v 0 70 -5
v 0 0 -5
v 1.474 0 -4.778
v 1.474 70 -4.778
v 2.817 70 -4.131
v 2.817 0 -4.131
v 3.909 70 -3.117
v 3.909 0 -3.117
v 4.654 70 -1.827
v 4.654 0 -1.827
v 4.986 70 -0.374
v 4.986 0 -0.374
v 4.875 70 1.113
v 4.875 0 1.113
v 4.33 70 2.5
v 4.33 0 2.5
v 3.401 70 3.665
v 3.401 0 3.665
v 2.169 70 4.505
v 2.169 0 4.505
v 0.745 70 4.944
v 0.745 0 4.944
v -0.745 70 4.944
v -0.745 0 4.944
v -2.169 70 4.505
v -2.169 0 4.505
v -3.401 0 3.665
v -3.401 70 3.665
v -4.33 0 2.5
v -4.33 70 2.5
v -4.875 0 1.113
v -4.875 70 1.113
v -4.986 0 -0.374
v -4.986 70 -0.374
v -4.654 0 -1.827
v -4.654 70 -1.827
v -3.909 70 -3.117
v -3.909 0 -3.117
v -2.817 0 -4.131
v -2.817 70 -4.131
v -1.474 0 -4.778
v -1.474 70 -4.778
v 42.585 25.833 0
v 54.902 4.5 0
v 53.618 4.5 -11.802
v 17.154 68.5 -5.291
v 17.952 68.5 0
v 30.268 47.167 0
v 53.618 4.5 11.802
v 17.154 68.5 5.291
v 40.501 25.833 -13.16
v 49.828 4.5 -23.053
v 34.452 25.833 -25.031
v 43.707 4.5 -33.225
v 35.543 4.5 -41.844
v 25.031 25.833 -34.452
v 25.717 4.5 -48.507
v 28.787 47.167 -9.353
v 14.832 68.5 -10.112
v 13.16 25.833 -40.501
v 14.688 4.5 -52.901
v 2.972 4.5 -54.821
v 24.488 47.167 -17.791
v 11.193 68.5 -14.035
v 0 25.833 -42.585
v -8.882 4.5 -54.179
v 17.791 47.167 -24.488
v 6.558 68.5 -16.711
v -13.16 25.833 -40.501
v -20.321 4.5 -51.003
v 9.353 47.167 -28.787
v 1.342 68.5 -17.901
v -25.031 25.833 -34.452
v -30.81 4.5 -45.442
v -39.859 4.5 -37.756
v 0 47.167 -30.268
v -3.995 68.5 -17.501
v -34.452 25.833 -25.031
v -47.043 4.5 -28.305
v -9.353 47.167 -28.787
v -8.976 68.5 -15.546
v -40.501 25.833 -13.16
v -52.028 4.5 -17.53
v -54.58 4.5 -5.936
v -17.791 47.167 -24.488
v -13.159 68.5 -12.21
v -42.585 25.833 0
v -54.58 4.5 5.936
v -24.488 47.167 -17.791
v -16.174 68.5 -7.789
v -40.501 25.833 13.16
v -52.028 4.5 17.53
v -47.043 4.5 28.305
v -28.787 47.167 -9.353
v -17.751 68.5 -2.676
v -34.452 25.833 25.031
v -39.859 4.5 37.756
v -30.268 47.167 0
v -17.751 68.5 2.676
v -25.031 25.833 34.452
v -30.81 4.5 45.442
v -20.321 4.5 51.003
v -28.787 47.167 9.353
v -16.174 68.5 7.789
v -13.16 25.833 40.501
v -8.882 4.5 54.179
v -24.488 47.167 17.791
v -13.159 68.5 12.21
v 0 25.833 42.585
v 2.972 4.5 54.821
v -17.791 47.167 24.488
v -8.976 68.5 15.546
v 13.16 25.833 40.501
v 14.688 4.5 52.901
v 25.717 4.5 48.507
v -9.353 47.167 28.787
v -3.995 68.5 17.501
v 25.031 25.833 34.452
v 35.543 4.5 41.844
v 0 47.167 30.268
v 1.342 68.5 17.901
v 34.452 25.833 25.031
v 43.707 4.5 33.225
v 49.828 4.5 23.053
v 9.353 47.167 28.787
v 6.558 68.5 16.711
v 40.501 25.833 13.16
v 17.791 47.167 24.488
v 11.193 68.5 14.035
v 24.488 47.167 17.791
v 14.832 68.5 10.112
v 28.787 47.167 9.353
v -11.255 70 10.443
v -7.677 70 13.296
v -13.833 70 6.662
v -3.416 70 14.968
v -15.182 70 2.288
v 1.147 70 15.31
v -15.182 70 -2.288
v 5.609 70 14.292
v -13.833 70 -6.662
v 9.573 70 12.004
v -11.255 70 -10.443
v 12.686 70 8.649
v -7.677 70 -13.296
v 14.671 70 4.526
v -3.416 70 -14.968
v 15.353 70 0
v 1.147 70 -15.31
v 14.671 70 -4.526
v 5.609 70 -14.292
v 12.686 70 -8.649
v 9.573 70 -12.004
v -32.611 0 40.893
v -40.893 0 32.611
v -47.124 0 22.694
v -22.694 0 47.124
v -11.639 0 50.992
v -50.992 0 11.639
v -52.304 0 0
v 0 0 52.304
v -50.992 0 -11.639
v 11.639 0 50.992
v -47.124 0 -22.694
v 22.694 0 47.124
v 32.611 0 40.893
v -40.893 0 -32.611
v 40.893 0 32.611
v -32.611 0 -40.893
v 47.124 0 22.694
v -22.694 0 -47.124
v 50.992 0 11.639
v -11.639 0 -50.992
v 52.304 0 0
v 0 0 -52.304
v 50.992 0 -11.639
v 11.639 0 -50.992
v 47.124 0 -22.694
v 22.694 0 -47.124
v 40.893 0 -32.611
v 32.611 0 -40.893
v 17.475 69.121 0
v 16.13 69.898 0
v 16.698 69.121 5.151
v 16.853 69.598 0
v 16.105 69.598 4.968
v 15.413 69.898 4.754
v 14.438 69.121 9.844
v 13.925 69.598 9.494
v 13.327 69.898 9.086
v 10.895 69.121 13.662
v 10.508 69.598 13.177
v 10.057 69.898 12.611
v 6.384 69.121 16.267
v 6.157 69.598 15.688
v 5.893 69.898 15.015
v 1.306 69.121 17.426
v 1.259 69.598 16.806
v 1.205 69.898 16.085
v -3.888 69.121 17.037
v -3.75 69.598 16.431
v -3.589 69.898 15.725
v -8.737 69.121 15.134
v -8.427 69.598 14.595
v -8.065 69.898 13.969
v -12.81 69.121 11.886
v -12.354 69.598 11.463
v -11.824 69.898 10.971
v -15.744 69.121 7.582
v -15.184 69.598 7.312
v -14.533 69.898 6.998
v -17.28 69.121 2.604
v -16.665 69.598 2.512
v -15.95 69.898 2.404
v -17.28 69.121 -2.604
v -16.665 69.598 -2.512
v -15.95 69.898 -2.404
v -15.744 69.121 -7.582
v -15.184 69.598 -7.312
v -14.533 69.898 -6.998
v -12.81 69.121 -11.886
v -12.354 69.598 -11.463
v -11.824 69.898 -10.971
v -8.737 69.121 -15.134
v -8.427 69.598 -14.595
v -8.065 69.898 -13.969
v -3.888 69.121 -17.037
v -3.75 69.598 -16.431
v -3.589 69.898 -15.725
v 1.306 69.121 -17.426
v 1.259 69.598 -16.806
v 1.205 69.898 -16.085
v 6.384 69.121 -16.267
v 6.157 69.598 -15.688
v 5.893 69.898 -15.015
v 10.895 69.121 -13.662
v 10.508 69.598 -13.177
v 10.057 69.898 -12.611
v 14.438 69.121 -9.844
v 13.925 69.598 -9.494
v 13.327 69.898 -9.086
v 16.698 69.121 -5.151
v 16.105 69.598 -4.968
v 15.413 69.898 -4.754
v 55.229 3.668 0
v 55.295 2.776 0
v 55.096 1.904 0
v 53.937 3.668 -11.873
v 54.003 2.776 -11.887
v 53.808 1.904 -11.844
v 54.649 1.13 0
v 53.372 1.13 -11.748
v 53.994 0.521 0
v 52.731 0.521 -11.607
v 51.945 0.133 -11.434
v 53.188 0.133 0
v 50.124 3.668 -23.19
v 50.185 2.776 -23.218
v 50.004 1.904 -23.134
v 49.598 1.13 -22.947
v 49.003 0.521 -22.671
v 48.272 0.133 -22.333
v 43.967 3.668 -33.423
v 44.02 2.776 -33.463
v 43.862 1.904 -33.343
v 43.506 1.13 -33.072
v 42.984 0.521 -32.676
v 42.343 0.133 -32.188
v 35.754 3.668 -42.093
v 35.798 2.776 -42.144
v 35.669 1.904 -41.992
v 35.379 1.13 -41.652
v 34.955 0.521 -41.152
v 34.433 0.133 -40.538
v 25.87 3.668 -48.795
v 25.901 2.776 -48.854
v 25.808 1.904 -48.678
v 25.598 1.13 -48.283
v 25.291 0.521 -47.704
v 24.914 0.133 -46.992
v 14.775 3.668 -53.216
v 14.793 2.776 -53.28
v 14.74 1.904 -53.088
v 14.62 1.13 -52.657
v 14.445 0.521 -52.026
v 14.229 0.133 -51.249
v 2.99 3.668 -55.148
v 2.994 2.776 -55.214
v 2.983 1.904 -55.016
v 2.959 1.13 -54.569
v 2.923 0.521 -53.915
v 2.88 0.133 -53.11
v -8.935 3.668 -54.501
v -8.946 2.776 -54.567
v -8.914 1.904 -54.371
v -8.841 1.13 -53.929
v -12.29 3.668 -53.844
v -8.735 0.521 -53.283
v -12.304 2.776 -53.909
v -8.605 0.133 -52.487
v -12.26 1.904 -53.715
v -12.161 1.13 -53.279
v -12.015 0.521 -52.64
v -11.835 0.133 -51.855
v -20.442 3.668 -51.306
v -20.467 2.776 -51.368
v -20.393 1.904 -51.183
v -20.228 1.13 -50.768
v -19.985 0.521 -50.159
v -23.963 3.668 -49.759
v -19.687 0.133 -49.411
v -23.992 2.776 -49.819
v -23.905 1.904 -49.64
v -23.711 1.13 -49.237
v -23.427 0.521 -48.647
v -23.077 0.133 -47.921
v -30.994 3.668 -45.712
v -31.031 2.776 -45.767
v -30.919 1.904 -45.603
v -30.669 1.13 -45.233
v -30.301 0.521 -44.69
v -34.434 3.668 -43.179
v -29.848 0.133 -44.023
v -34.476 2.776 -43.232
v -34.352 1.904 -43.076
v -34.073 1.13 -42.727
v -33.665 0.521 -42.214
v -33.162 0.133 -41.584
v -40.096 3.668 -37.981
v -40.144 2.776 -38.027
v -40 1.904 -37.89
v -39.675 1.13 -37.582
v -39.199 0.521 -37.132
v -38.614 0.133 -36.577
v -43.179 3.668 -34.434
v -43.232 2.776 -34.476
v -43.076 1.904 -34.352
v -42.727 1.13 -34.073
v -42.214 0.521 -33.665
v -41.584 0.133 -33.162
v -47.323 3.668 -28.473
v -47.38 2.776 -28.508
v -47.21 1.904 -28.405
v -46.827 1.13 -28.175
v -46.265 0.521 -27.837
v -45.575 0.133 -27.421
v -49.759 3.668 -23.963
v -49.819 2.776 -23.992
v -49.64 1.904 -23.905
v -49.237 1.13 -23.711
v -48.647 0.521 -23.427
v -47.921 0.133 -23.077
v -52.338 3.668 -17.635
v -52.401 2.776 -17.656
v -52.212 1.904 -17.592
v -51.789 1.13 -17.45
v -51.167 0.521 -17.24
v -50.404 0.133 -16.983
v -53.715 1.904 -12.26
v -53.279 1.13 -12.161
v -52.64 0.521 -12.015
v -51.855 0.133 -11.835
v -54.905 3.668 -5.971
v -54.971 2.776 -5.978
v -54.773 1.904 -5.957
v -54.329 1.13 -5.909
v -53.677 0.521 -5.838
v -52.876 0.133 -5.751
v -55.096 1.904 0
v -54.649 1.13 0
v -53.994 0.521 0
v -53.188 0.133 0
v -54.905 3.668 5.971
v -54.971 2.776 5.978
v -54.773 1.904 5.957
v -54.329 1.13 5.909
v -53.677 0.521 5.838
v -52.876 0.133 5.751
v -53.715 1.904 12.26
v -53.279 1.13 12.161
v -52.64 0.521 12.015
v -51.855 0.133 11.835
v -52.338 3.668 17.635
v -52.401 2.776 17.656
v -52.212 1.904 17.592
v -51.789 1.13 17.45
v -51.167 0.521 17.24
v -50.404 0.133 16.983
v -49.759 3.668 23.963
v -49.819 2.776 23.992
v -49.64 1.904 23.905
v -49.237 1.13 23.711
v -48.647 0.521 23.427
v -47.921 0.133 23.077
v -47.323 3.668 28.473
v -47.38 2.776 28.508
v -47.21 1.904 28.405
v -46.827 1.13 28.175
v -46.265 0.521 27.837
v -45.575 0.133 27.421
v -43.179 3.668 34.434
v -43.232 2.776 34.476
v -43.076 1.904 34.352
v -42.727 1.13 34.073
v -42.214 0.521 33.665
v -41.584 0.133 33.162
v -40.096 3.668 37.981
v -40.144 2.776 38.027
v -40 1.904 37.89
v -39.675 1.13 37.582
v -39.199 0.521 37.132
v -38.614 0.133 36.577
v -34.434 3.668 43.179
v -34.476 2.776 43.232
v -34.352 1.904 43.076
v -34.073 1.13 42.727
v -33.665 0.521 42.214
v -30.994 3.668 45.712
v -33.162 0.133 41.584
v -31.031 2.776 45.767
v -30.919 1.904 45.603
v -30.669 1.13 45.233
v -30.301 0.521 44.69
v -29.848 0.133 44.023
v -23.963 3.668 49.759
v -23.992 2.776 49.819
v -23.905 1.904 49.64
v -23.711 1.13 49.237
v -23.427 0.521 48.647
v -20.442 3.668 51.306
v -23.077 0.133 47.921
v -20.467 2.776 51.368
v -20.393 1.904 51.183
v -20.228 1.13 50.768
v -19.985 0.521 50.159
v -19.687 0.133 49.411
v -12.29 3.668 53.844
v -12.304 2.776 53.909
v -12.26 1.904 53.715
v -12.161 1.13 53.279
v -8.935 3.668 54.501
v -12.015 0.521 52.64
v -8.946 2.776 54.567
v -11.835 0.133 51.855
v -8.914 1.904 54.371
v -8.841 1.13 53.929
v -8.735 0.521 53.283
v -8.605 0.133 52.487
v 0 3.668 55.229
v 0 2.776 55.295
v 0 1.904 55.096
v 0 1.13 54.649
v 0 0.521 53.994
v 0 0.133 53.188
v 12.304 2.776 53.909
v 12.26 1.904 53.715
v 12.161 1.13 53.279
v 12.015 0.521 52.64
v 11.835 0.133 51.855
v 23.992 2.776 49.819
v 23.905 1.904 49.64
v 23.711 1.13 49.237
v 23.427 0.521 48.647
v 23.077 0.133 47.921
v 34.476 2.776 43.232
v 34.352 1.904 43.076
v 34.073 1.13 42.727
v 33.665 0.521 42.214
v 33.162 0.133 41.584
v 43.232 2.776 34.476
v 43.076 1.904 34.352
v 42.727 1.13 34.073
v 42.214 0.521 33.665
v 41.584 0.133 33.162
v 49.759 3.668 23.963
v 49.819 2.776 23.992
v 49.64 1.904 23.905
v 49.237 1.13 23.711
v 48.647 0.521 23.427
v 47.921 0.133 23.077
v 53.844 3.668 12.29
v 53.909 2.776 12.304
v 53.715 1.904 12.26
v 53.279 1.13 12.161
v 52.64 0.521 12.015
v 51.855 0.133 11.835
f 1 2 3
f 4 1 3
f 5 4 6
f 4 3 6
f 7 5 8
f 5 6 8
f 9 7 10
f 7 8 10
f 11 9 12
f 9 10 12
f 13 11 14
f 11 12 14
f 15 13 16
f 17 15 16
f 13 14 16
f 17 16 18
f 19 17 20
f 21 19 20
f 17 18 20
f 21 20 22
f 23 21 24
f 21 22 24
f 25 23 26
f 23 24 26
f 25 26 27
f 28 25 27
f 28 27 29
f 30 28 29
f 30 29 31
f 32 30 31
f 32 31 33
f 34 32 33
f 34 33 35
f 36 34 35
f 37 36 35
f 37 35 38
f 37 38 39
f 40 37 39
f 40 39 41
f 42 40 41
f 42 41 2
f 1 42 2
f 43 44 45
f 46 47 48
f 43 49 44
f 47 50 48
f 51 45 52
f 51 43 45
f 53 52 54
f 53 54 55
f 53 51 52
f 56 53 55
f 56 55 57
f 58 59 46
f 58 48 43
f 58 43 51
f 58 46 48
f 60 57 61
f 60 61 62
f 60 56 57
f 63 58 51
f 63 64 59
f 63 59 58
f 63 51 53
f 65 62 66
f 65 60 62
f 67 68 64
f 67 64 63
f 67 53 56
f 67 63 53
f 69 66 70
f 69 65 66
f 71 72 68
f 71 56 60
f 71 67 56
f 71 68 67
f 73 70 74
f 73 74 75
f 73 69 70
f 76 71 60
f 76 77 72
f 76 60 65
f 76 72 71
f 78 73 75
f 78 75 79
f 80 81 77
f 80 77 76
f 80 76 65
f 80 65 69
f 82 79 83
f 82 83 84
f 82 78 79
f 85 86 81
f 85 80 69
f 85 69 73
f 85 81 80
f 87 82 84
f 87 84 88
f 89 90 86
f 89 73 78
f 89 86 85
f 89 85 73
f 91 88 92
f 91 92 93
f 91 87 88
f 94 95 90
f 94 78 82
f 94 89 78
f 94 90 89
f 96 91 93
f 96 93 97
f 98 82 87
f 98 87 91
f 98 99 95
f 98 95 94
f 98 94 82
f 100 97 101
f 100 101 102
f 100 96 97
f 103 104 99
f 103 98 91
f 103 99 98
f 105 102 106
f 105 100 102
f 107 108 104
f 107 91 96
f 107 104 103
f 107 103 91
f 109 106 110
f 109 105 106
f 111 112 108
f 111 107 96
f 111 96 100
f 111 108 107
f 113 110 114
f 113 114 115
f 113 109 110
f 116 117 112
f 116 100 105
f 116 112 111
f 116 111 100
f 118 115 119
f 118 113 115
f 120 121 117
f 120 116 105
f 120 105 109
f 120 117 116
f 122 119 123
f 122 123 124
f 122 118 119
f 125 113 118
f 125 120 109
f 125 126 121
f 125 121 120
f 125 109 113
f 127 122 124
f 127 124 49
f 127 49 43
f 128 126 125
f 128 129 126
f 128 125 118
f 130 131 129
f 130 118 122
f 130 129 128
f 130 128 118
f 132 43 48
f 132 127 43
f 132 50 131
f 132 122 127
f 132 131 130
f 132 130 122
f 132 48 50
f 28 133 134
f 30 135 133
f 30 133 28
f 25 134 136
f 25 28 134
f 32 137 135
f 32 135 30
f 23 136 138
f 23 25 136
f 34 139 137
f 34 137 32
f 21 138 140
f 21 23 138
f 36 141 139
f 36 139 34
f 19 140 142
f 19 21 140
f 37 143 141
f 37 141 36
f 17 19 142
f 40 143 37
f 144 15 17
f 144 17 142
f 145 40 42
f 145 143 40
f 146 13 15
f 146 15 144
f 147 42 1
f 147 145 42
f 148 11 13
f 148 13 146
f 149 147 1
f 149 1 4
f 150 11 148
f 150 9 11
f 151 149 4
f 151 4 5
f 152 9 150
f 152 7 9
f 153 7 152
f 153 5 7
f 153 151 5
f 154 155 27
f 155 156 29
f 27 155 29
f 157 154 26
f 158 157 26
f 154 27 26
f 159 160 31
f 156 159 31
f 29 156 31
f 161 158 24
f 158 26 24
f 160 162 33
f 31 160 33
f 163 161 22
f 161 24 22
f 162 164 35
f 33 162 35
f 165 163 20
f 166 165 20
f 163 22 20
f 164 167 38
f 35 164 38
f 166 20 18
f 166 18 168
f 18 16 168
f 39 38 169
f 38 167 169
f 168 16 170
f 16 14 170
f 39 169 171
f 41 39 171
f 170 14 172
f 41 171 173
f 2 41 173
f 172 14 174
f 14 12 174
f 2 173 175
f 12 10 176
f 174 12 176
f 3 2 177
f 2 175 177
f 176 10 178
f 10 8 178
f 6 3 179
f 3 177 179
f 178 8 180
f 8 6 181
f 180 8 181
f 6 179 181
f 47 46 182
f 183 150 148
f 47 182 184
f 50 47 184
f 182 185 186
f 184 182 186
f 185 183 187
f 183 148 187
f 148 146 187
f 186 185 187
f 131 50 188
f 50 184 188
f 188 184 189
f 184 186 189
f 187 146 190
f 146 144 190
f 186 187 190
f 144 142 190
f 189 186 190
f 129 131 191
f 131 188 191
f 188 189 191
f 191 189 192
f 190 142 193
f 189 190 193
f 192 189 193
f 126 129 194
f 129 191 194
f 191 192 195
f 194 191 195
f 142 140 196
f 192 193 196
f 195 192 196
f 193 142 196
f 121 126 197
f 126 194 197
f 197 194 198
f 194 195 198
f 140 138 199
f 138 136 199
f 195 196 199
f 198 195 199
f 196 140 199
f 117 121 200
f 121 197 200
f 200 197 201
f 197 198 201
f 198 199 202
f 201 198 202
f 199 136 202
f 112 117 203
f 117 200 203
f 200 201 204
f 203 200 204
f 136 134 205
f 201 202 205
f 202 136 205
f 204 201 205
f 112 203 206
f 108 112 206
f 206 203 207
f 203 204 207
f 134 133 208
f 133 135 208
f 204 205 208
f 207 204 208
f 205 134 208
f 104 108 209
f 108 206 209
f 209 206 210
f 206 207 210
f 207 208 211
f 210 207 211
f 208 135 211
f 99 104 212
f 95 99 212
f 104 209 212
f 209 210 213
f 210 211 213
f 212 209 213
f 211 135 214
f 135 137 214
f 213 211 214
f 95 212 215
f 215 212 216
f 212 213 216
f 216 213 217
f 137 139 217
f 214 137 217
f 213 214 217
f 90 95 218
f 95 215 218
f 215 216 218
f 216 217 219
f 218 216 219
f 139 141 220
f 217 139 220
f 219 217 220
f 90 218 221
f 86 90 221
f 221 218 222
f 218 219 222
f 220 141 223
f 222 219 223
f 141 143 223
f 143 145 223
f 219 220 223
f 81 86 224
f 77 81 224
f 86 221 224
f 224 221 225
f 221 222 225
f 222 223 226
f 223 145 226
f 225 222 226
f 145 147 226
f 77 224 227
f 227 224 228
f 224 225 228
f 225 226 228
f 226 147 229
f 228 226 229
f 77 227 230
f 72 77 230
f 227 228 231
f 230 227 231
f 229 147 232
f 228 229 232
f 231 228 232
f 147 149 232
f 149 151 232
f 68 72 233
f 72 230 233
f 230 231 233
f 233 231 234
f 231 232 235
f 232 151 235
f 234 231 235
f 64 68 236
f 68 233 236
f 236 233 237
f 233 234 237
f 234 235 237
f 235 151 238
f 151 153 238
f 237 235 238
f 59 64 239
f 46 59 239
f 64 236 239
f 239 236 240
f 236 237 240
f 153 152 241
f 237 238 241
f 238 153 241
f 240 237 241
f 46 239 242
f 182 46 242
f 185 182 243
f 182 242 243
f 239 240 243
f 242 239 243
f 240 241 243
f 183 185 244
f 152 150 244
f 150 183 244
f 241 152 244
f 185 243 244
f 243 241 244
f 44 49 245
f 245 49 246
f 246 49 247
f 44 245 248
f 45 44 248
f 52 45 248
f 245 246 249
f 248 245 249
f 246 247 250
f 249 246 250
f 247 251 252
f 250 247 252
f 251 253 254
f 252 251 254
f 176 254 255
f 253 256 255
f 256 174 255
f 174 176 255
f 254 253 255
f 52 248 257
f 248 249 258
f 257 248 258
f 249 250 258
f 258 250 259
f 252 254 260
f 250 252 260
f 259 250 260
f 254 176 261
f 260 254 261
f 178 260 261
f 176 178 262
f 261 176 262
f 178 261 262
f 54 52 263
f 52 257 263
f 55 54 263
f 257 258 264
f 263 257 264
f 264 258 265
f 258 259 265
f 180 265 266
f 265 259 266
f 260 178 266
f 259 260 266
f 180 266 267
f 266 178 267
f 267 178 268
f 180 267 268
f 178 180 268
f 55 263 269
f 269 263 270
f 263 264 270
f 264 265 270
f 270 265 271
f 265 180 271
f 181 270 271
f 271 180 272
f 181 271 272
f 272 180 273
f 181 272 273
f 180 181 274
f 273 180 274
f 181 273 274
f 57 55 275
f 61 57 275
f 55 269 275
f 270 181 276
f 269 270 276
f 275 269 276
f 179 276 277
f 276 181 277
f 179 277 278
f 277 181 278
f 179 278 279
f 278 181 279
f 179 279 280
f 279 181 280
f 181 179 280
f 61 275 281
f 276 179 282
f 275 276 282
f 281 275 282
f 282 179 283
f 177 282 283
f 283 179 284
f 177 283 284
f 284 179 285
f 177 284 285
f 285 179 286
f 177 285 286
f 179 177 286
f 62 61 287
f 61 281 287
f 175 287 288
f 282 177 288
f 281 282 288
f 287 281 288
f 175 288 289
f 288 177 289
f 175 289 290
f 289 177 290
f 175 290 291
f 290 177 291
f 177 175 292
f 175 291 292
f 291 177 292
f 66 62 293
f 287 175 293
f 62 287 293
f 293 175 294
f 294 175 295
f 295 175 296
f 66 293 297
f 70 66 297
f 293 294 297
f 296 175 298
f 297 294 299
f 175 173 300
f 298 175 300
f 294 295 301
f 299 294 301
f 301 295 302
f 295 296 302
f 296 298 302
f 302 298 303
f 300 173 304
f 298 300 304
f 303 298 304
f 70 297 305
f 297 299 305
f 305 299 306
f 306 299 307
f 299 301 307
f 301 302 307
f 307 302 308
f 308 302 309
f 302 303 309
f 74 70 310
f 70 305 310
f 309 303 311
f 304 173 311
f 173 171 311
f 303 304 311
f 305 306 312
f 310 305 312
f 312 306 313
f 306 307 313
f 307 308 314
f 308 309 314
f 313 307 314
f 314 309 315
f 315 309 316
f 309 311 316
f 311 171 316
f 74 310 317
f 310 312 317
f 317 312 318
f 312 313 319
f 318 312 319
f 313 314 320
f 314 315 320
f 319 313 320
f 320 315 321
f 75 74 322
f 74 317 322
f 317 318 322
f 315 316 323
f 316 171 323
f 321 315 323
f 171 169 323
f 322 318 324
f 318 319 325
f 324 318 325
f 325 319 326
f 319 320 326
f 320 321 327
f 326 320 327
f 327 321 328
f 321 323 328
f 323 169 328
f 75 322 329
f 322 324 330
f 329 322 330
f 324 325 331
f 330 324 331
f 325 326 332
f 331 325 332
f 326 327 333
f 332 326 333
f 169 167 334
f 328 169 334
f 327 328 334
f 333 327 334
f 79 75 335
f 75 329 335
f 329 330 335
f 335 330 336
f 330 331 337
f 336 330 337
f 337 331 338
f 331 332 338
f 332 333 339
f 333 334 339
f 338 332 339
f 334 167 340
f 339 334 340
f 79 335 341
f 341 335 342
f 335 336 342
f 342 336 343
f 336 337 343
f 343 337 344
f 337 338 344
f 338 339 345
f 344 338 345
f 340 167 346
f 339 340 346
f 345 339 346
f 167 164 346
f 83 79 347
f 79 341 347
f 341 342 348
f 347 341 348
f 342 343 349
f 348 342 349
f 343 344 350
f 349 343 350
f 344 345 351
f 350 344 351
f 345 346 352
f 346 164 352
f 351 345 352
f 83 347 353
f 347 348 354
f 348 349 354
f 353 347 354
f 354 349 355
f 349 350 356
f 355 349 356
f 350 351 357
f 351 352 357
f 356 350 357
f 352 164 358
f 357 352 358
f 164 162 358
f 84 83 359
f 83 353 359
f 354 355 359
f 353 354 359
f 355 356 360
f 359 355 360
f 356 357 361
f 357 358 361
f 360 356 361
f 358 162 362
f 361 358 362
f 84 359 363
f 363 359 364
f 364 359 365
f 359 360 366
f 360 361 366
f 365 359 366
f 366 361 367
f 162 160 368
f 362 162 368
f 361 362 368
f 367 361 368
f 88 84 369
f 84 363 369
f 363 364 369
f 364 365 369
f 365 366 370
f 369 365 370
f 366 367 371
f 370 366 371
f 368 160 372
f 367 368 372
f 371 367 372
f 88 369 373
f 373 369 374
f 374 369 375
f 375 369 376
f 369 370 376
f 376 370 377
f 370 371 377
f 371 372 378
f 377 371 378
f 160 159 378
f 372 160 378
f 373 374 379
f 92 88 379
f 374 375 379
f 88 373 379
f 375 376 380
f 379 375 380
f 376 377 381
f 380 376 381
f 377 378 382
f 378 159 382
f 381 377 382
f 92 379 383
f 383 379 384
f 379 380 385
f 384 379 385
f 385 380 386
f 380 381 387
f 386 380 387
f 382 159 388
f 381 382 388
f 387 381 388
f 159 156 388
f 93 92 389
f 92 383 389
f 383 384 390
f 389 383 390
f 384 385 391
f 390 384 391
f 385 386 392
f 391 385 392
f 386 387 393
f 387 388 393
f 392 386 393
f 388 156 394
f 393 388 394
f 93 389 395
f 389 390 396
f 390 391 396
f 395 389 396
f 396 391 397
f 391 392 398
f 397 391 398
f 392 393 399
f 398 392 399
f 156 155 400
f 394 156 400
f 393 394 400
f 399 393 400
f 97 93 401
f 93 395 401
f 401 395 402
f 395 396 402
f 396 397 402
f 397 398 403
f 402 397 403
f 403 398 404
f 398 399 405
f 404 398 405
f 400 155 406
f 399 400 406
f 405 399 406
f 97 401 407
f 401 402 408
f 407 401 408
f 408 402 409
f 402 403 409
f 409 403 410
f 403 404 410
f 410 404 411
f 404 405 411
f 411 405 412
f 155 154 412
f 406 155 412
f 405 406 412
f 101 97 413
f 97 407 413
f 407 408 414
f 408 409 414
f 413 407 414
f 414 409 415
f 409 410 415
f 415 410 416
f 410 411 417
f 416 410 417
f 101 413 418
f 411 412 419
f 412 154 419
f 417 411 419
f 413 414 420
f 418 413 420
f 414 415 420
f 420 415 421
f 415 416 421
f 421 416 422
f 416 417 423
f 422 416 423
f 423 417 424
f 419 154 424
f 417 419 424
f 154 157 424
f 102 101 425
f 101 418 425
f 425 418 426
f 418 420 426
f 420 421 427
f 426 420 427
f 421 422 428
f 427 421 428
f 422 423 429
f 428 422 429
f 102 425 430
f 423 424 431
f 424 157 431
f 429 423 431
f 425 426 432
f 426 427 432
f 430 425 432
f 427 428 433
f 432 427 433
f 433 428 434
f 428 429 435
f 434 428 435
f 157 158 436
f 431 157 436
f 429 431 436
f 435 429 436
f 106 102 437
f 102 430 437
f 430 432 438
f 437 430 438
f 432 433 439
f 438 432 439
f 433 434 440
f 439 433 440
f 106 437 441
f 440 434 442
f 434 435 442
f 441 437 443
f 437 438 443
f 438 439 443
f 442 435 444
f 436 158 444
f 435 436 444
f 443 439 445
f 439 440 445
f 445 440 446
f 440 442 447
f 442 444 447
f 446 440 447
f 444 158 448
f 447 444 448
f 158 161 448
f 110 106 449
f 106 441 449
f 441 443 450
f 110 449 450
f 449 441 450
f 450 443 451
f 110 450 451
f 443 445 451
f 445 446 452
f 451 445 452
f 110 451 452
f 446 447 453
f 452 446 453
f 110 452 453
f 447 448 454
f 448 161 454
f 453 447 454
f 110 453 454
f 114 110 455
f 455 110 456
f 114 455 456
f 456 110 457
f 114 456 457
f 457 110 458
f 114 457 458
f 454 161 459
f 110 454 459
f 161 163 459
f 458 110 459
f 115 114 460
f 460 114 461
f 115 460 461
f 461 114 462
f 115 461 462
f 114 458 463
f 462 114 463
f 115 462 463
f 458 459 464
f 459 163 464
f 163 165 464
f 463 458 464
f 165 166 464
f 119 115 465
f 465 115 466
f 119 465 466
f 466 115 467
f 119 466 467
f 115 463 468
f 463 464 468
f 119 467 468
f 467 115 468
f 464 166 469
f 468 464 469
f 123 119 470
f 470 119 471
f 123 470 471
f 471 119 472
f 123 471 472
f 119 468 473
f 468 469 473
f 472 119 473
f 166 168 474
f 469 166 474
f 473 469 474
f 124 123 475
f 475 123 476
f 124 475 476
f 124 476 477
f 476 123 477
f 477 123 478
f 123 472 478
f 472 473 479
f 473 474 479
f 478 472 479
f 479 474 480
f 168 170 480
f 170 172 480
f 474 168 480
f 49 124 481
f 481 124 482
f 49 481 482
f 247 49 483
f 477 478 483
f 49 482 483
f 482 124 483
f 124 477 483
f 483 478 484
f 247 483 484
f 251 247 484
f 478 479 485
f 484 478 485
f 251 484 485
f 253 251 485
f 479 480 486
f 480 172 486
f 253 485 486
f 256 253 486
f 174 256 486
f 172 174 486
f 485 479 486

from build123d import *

# Parameters (mm, degrees)
SKETCH1_R           = 57.5
BOSS_EXTRUDE1_DEPTH = 70
BOSS_EXTRUDE1_TAPER = 30
SKETCH3_R           = 5
CUT_EXTRUDE2_DEPTH  = 108.296318842
FILLET1_R           = 3


with BuildPart() as part:
    # Sketch1 → Boss-Extrude1 (new body)
    with BuildSketch(Plane(origin=(0, 0, 0), x_dir=(1, 0, 0), z_dir=(0, 1, 0))):
        Circle(SKETCH1_R)
    extrude(amount=BOSS_EXTRUDE1_DEPTH, taper=BOSS_EXTRUDE1_TAPER)

    # Sketch3 → Cut-Extrude2 (cut, through all)
    with BuildSketch(Plane.XZ):
        with Locations(Location((0, 0, 0), (0, 0, 270))):
            Circle(SKETCH3_R)
    extrude(amount=-CUT_EXTRUDE2_DEPTH, mode=Mode.SUBTRACT)

    # Fillet1
    fillet1_edges = [part.edges().sort_by_distance(p)[0] for p in [
        (-57.5, 0, 0),
        (-17.085481157, 70, 0),
    ]]
    fillet(fillet1_edges, radius=FILLET1_R)


solid = part.part
